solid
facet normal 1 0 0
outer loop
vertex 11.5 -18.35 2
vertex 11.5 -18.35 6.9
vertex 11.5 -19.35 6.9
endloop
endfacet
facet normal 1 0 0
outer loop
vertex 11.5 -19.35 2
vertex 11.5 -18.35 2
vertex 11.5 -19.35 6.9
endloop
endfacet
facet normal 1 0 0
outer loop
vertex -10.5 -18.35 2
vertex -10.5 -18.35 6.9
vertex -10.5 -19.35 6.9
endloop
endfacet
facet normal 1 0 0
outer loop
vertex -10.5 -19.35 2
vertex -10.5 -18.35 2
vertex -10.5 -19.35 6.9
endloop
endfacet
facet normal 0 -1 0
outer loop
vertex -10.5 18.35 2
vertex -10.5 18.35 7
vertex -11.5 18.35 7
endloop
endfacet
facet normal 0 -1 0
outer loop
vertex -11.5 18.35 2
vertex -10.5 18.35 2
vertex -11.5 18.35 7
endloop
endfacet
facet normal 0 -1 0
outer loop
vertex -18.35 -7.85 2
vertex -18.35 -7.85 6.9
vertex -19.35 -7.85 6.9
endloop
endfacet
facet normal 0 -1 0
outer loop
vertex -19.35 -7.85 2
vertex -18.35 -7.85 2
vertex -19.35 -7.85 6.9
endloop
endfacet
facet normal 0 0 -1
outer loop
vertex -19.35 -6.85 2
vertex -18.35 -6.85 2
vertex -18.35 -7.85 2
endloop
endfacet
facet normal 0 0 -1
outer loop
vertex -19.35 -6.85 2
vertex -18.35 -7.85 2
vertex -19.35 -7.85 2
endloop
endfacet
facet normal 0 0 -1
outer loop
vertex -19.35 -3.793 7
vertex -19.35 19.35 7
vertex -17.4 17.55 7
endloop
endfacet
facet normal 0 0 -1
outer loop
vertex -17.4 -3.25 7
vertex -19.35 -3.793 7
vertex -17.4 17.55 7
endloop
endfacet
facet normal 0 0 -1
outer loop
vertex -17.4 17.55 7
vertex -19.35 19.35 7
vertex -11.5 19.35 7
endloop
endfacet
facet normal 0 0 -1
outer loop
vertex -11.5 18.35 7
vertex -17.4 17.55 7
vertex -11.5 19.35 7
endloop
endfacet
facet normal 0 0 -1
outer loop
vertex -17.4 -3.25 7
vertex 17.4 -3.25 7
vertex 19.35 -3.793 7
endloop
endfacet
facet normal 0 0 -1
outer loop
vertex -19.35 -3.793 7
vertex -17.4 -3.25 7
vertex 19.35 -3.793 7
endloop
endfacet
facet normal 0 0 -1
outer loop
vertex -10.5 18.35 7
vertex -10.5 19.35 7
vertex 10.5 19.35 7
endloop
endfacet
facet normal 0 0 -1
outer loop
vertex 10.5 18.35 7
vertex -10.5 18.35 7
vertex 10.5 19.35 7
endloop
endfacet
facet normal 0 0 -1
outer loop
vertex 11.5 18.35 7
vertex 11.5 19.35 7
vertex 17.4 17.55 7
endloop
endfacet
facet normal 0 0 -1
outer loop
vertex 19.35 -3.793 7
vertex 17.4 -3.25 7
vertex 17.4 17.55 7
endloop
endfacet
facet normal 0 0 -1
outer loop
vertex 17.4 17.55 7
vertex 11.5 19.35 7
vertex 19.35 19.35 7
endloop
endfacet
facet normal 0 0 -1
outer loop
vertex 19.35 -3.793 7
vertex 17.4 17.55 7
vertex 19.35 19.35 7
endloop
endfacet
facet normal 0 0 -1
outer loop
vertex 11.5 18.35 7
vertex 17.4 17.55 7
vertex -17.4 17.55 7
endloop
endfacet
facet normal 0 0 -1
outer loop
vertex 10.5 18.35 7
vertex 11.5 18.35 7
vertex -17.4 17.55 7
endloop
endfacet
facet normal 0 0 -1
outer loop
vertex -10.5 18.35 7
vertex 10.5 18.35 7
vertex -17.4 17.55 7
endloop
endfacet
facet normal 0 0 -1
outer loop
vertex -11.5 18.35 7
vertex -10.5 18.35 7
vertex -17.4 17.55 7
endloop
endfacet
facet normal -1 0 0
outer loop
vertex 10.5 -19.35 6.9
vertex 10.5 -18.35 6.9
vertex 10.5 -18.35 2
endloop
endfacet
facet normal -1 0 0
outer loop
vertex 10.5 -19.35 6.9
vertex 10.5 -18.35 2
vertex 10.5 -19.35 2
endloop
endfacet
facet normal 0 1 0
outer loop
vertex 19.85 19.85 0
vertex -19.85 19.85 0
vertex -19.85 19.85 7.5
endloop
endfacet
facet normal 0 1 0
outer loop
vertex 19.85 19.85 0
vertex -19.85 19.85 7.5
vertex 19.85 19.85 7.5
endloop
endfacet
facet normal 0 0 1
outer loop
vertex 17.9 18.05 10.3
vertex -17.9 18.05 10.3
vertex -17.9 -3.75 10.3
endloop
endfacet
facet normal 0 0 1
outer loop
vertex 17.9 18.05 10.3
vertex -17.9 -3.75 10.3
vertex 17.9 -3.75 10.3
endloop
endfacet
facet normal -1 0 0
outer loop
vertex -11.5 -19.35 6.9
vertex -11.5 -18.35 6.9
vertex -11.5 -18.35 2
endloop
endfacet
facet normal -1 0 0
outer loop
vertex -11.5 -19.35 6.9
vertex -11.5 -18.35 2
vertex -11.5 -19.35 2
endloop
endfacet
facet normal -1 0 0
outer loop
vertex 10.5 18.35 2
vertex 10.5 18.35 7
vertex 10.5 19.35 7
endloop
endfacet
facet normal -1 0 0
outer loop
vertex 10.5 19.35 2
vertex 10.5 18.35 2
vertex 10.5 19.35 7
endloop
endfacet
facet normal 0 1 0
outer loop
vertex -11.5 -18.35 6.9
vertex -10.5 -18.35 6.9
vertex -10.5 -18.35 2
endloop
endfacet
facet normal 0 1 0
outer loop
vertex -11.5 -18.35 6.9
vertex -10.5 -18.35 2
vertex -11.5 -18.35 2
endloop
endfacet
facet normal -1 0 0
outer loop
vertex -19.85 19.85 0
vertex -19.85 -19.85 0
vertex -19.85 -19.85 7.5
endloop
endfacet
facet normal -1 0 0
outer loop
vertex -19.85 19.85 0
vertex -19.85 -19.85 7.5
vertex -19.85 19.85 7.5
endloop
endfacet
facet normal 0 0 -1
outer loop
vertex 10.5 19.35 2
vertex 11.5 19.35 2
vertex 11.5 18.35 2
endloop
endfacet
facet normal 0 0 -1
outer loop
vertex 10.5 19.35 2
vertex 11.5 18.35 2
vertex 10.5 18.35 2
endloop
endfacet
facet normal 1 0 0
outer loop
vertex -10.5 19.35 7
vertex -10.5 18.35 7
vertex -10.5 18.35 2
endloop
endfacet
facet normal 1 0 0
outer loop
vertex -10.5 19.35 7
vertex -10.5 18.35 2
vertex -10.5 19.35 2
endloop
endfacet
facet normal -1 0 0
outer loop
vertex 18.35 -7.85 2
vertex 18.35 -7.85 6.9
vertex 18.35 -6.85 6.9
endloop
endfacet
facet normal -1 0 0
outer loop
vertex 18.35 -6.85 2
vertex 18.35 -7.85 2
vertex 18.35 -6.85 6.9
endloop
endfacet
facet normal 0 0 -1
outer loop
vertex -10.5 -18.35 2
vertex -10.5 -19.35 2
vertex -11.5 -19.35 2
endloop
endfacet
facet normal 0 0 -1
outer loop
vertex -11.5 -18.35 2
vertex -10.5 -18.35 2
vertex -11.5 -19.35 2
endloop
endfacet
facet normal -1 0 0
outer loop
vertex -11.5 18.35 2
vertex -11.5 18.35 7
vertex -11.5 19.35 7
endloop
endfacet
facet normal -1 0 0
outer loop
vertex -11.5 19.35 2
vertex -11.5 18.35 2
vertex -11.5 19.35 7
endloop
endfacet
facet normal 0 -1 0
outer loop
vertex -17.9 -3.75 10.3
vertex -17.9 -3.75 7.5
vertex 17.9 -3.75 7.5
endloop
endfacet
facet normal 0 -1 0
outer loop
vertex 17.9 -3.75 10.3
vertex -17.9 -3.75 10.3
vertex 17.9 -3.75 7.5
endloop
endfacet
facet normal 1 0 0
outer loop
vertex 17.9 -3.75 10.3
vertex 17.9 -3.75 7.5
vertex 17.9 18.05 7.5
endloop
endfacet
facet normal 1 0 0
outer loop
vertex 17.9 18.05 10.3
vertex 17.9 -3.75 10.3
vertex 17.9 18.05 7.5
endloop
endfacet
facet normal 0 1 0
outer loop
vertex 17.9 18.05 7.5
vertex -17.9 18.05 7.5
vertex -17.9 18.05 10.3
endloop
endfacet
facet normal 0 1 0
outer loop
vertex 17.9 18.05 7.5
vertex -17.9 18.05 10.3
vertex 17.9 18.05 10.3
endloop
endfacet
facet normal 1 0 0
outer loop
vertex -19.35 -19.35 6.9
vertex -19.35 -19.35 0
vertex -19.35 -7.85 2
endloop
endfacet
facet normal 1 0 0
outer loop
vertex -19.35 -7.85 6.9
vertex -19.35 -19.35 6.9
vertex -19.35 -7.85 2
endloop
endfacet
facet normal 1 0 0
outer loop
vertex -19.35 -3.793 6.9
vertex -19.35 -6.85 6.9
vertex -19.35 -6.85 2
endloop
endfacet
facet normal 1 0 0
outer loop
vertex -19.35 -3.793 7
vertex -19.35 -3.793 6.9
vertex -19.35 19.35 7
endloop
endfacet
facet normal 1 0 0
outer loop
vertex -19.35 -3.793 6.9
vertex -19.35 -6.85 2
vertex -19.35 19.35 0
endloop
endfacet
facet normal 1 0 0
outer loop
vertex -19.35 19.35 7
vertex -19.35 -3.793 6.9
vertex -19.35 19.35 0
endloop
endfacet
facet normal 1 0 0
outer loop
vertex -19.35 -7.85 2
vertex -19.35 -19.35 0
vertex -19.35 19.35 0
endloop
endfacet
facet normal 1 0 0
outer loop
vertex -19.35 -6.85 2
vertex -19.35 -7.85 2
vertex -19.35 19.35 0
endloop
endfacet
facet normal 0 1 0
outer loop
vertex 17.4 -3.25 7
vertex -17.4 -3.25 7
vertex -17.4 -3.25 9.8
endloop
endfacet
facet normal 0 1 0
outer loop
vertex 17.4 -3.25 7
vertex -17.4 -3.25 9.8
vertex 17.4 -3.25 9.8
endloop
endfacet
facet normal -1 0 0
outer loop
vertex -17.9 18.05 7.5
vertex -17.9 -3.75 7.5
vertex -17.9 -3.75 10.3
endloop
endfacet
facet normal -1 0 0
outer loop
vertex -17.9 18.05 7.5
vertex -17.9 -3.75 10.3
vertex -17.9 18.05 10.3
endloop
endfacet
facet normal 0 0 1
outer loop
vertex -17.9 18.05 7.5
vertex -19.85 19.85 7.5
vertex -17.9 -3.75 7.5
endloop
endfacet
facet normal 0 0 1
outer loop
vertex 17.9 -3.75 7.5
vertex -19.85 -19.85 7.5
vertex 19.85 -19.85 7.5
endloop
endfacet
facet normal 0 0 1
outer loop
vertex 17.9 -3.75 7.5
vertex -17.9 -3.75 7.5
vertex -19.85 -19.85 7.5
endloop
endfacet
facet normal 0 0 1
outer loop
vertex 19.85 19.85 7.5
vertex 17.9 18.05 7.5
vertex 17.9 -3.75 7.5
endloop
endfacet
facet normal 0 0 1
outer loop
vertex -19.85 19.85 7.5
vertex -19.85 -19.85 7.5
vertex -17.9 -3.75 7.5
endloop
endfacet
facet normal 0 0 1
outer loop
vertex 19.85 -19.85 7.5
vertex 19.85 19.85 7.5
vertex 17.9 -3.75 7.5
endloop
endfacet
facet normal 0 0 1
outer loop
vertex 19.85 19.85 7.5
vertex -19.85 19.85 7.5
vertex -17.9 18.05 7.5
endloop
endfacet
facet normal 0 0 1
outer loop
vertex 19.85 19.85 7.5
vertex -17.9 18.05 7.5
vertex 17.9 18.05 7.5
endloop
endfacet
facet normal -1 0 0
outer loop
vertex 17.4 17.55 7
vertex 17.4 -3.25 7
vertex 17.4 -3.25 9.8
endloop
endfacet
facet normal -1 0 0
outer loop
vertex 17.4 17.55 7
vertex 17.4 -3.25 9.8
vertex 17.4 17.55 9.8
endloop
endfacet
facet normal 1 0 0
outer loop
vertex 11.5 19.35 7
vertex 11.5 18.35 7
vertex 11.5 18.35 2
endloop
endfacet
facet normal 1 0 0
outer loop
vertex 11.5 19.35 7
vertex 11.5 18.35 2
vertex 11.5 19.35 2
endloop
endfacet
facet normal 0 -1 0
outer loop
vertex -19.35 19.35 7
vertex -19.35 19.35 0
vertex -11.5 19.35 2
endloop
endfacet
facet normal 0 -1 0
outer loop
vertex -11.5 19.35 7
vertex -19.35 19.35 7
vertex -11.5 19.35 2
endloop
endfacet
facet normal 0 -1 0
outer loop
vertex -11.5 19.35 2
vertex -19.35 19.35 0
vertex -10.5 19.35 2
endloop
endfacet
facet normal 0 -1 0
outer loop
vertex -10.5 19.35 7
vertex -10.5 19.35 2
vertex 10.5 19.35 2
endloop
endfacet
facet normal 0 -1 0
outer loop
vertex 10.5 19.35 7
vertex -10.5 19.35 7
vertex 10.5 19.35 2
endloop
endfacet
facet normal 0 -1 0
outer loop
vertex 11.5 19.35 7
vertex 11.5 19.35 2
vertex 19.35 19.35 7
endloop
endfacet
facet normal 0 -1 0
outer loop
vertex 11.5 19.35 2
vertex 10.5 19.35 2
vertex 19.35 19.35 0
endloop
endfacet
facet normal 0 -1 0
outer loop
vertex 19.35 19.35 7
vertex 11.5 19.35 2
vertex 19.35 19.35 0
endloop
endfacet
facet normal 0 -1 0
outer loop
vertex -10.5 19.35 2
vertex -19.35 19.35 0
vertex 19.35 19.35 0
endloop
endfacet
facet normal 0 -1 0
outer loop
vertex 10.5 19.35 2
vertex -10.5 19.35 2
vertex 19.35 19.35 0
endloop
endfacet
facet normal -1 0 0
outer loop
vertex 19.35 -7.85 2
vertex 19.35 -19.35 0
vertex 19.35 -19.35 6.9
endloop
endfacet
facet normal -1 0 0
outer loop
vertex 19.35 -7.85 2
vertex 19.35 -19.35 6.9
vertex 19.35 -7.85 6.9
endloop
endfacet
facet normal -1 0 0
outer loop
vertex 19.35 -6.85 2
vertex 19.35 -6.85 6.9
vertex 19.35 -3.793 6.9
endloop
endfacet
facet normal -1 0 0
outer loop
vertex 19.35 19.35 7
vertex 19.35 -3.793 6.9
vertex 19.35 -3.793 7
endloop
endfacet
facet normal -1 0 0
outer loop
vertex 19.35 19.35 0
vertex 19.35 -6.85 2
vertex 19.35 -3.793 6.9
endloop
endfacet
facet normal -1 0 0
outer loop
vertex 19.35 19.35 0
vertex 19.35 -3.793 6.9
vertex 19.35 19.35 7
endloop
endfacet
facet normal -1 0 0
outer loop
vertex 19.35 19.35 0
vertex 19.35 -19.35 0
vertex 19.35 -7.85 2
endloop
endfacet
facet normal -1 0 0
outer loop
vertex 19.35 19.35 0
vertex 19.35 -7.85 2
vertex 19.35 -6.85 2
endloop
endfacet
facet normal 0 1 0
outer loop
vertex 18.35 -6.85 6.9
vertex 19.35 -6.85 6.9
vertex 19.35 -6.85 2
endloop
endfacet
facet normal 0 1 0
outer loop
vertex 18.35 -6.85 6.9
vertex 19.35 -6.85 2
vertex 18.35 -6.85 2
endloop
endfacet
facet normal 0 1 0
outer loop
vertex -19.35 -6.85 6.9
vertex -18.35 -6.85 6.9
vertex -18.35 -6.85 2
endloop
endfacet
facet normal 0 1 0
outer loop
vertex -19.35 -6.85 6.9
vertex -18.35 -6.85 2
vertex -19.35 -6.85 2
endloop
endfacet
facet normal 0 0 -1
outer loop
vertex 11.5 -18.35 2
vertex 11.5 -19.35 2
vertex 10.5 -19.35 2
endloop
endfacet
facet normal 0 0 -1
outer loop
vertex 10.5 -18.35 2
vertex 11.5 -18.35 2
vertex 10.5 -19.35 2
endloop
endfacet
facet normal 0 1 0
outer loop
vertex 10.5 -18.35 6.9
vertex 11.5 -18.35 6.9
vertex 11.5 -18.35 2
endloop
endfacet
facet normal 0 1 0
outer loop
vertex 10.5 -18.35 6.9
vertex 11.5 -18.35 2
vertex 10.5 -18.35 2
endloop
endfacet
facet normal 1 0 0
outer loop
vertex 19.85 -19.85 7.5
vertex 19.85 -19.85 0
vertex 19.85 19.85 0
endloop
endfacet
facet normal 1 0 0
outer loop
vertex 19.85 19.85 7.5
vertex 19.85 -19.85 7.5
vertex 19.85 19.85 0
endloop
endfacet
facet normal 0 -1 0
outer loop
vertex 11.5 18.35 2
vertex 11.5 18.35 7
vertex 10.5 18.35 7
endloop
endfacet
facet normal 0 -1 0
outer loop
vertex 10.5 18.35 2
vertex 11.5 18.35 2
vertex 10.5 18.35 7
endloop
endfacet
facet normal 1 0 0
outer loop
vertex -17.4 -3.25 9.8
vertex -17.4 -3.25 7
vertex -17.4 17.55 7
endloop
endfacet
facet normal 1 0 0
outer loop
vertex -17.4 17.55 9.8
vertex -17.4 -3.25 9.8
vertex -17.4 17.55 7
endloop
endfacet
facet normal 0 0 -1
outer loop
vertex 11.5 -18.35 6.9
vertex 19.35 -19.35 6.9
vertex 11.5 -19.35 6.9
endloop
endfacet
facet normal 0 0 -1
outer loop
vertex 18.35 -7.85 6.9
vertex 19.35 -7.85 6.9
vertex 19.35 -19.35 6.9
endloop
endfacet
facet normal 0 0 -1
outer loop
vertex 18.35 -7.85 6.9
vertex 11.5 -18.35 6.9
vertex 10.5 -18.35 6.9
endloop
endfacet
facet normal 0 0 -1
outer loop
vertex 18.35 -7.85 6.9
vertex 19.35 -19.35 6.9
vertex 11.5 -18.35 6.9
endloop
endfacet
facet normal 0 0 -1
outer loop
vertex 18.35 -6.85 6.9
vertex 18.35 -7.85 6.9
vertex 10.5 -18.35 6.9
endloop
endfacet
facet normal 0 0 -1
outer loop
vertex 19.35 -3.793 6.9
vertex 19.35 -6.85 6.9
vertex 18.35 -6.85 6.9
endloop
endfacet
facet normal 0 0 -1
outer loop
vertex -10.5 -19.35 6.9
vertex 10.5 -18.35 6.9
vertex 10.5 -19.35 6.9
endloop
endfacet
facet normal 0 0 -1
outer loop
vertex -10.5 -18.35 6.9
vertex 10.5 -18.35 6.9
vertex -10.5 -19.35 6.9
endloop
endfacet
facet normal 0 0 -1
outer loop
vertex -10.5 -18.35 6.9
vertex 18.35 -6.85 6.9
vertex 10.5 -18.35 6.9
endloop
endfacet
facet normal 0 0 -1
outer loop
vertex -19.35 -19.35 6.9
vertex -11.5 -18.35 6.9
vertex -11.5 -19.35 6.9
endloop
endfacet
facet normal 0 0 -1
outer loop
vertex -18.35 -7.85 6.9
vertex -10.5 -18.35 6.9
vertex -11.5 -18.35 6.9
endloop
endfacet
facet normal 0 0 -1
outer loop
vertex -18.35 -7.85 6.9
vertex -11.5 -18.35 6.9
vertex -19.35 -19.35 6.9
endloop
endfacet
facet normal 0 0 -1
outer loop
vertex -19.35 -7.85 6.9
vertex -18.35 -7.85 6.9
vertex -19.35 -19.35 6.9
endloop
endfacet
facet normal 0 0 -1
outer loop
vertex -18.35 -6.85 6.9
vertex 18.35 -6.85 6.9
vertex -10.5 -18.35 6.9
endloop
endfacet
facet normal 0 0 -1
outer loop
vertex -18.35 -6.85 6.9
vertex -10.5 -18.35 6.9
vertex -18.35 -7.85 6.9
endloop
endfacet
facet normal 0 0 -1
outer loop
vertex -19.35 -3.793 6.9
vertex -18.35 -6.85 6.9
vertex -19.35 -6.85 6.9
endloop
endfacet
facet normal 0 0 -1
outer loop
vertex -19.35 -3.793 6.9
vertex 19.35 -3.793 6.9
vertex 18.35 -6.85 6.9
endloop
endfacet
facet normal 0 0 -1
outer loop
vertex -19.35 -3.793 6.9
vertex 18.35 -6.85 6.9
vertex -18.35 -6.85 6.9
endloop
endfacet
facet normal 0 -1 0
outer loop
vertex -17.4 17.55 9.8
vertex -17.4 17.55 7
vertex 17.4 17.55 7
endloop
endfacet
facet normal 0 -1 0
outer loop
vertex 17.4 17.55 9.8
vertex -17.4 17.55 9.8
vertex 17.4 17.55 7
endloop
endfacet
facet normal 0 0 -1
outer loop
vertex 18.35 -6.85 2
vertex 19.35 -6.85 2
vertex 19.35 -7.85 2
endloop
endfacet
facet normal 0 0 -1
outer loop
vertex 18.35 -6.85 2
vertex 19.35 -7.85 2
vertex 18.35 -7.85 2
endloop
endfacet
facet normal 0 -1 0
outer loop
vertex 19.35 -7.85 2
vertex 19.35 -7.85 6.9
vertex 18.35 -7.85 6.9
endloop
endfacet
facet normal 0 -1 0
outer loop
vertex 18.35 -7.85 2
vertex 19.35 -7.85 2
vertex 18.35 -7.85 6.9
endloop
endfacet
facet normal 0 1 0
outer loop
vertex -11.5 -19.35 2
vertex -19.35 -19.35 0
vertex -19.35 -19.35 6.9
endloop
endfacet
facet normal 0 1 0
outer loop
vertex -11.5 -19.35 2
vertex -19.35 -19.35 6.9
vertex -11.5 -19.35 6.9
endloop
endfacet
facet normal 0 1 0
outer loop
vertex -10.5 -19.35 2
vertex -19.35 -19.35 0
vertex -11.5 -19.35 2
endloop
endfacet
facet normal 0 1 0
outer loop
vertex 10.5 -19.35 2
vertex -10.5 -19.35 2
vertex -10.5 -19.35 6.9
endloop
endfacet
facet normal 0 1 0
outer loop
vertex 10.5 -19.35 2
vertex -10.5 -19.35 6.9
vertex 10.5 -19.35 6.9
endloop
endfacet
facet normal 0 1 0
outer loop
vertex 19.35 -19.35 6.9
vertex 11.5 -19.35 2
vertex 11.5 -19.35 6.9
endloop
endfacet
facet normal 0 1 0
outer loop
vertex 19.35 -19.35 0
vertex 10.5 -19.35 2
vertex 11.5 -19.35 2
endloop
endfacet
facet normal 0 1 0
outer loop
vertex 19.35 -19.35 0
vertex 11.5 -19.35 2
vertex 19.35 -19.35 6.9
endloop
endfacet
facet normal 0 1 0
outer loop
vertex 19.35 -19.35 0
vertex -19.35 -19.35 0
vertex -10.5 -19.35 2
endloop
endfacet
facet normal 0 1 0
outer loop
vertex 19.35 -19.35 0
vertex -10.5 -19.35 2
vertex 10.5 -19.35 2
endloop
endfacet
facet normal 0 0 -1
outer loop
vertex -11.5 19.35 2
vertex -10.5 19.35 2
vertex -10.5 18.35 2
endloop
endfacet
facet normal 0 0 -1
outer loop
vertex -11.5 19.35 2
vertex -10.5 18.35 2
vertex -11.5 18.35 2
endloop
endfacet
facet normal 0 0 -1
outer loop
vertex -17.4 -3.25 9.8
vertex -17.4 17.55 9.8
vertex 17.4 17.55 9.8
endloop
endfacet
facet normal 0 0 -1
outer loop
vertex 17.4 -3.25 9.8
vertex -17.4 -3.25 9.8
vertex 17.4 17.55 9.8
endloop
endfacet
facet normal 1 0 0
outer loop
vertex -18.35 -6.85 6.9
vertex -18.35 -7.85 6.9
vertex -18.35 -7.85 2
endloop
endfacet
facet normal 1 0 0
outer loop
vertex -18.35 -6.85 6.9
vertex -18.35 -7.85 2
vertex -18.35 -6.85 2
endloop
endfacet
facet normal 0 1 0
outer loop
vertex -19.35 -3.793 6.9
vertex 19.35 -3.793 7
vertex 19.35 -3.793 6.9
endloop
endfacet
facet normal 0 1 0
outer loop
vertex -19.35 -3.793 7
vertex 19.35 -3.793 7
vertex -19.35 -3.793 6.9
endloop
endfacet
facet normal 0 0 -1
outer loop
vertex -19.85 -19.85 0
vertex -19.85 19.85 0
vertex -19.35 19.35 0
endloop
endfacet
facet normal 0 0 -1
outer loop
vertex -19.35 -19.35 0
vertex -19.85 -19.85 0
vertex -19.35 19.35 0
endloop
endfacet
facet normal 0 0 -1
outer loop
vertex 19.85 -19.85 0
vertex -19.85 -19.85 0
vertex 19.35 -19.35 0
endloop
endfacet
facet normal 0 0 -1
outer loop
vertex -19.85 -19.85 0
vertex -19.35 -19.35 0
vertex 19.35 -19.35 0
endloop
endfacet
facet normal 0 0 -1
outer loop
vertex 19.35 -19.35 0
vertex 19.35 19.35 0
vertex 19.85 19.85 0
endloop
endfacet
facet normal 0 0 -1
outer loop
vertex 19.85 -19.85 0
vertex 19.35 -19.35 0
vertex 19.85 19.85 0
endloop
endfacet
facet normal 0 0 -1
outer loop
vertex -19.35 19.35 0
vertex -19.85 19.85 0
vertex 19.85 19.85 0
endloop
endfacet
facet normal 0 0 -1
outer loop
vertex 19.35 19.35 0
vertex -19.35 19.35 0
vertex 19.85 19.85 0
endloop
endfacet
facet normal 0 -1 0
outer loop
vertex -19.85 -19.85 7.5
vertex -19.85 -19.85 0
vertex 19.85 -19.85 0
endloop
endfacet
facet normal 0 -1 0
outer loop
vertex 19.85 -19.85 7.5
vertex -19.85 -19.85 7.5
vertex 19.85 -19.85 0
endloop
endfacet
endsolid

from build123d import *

# Parameters (mm, degrees)
SKETCH1_W           = 39.7
SKETCH1_H           = 39.7
BOSS_EXTRUDE1_DEPTH = 7.5
SKETCH2_W           = 35.8
SKETCH2_H           = 21.8
BOSS_EXTRUDE2_DEPTH = 2.8
SHELL1_T            = -0.5
SKETCH4_W           = 1
SKETCH4_H           = 1
BOSS_EXTRUDE3_DEPTH = 5
SKETCH5_W           = 1
SKETCH5_H           = 1
BOSS_EXTRUDE4_DEPTH = 5
SKETCH6_W           = 38.7
SKETCH6_H           = 15.557355087
BOSS_EXTRUDE5_DEPTH = 0.1


with BuildPart() as part:
    # Sketch1 → Boss-Extrude1 (new body)
    with BuildSketch(Plane.XY):
        Rectangle(SKETCH1_W, SKETCH1_H)
    extrude(amount=BOSS_EXTRUDE1_DEPTH)

    # Sketch2 → Boss-Extrude2 (add)
    with BuildSketch(Plane.XY.offset(7.5)):
        with Locations((0, 7.15)):
            Rectangle(SKETCH2_W, SKETCH2_H)
    extrude(amount=BOSS_EXTRUDE2_DEPTH)

    # Shell1
    shell1_openings = [part.faces().sort_by_distance(p)[0] for p in [
        (0, 0, 0),
    ]]
    offset(amount=SHELL1_T, openings=shell1_openings, kind=Kind.INTERSECTION)

    # Sketch4 → Boss-Extrude3 (add)
    with BuildSketch(Plane(origin=(0, 0, 7), x_dir=(-1, 0, 0), z_dir=(0, 0, -1))):
        with Locations((-11, 18.85)):
            Rectangle(SKETCH4_W, SKETCH4_H)
        with Locations((11, 18.85)):
            Rectangle(SKETCH4_W, SKETCH4_H)
    boss_extrude3 = extrude(amount=BOSS_EXTRUDE3_DEPTH)

    # Mirror1: Boss-Extrude3 across plane
    add(boss_extrude3.mirror(Plane.ZX))

    # Sketch5 → Boss-Extrude4 (add)
    with BuildSketch(Plane(origin=(0, 0, 7), x_dir=(-1, 0, 0), z_dir=(0, 0, -1))):
        with Locations((-18.85, -7.35)):
            Rectangle(SKETCH5_W, SKETCH5_H)
        with Locations((18.85, -7.35)):
            Rectangle(SKETCH5_W, SKETCH5_H)
    extrude(amount=BOSS_EXTRUDE4_DEPTH)

    # Sketch6 → Boss-Extrude5 (add)
    with BuildSketch(Plane(origin=(0, 0, 7), x_dir=(-1, 0, 0), z_dir=(0, 0, -1))):
        with Locations((0, -11.571322457)):
            Rectangle(SKETCH6_W, SKETCH6_H)
    extrude(amount=BOSS_EXTRUDE5_DEPTH)


solid = part.part
